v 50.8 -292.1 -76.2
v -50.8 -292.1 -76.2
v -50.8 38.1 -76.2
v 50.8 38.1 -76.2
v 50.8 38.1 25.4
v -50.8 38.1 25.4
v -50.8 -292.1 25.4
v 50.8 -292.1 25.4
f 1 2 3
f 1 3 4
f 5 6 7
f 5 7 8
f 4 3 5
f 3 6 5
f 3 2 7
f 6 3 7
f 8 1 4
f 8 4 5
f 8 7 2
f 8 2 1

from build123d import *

# Parameters (mm, degrees)
F0_W      = 101.6
F0_H      = 76.2
F1_DEPTH  = 25.4
F1_FACE_W = 101.6
F1_FACE_H = 76.2
F2_DEPTH  = 76.2
F2_FACE_W = 101.6
F2_FACE_H = 101.6
F3_DEPTH  = 254


with BuildPart() as f1:
    # F0 (on Top) → F1 (new body)
    with BuildSketch(Plane.XY):
        Rectangle(F0_W, F0_H)
    extrude(amount=F1_DEPTH)

    # F1_face (on face) → F2 (join)
    with BuildSketch(Plane(origin=(0, 0, 0), x_dir=(1, 0, 0), z_dir=(0, 0, -1))):
        Rectangle(F1_FACE_W, F1_FACE_H)
    extrude(amount=F2_DEPTH)

    # F2_face (on face) → F3 (join)
    with BuildSketch(Plane(origin=(0, -38.1, -25.4), x_dir=(1, 0, 0), z_dir=(0, -1, 0))):
        Rectangle(F2_FACE_W, F2_FACE_H)
    extrude(amount=F3_DEPTH)


solid = f1.part
